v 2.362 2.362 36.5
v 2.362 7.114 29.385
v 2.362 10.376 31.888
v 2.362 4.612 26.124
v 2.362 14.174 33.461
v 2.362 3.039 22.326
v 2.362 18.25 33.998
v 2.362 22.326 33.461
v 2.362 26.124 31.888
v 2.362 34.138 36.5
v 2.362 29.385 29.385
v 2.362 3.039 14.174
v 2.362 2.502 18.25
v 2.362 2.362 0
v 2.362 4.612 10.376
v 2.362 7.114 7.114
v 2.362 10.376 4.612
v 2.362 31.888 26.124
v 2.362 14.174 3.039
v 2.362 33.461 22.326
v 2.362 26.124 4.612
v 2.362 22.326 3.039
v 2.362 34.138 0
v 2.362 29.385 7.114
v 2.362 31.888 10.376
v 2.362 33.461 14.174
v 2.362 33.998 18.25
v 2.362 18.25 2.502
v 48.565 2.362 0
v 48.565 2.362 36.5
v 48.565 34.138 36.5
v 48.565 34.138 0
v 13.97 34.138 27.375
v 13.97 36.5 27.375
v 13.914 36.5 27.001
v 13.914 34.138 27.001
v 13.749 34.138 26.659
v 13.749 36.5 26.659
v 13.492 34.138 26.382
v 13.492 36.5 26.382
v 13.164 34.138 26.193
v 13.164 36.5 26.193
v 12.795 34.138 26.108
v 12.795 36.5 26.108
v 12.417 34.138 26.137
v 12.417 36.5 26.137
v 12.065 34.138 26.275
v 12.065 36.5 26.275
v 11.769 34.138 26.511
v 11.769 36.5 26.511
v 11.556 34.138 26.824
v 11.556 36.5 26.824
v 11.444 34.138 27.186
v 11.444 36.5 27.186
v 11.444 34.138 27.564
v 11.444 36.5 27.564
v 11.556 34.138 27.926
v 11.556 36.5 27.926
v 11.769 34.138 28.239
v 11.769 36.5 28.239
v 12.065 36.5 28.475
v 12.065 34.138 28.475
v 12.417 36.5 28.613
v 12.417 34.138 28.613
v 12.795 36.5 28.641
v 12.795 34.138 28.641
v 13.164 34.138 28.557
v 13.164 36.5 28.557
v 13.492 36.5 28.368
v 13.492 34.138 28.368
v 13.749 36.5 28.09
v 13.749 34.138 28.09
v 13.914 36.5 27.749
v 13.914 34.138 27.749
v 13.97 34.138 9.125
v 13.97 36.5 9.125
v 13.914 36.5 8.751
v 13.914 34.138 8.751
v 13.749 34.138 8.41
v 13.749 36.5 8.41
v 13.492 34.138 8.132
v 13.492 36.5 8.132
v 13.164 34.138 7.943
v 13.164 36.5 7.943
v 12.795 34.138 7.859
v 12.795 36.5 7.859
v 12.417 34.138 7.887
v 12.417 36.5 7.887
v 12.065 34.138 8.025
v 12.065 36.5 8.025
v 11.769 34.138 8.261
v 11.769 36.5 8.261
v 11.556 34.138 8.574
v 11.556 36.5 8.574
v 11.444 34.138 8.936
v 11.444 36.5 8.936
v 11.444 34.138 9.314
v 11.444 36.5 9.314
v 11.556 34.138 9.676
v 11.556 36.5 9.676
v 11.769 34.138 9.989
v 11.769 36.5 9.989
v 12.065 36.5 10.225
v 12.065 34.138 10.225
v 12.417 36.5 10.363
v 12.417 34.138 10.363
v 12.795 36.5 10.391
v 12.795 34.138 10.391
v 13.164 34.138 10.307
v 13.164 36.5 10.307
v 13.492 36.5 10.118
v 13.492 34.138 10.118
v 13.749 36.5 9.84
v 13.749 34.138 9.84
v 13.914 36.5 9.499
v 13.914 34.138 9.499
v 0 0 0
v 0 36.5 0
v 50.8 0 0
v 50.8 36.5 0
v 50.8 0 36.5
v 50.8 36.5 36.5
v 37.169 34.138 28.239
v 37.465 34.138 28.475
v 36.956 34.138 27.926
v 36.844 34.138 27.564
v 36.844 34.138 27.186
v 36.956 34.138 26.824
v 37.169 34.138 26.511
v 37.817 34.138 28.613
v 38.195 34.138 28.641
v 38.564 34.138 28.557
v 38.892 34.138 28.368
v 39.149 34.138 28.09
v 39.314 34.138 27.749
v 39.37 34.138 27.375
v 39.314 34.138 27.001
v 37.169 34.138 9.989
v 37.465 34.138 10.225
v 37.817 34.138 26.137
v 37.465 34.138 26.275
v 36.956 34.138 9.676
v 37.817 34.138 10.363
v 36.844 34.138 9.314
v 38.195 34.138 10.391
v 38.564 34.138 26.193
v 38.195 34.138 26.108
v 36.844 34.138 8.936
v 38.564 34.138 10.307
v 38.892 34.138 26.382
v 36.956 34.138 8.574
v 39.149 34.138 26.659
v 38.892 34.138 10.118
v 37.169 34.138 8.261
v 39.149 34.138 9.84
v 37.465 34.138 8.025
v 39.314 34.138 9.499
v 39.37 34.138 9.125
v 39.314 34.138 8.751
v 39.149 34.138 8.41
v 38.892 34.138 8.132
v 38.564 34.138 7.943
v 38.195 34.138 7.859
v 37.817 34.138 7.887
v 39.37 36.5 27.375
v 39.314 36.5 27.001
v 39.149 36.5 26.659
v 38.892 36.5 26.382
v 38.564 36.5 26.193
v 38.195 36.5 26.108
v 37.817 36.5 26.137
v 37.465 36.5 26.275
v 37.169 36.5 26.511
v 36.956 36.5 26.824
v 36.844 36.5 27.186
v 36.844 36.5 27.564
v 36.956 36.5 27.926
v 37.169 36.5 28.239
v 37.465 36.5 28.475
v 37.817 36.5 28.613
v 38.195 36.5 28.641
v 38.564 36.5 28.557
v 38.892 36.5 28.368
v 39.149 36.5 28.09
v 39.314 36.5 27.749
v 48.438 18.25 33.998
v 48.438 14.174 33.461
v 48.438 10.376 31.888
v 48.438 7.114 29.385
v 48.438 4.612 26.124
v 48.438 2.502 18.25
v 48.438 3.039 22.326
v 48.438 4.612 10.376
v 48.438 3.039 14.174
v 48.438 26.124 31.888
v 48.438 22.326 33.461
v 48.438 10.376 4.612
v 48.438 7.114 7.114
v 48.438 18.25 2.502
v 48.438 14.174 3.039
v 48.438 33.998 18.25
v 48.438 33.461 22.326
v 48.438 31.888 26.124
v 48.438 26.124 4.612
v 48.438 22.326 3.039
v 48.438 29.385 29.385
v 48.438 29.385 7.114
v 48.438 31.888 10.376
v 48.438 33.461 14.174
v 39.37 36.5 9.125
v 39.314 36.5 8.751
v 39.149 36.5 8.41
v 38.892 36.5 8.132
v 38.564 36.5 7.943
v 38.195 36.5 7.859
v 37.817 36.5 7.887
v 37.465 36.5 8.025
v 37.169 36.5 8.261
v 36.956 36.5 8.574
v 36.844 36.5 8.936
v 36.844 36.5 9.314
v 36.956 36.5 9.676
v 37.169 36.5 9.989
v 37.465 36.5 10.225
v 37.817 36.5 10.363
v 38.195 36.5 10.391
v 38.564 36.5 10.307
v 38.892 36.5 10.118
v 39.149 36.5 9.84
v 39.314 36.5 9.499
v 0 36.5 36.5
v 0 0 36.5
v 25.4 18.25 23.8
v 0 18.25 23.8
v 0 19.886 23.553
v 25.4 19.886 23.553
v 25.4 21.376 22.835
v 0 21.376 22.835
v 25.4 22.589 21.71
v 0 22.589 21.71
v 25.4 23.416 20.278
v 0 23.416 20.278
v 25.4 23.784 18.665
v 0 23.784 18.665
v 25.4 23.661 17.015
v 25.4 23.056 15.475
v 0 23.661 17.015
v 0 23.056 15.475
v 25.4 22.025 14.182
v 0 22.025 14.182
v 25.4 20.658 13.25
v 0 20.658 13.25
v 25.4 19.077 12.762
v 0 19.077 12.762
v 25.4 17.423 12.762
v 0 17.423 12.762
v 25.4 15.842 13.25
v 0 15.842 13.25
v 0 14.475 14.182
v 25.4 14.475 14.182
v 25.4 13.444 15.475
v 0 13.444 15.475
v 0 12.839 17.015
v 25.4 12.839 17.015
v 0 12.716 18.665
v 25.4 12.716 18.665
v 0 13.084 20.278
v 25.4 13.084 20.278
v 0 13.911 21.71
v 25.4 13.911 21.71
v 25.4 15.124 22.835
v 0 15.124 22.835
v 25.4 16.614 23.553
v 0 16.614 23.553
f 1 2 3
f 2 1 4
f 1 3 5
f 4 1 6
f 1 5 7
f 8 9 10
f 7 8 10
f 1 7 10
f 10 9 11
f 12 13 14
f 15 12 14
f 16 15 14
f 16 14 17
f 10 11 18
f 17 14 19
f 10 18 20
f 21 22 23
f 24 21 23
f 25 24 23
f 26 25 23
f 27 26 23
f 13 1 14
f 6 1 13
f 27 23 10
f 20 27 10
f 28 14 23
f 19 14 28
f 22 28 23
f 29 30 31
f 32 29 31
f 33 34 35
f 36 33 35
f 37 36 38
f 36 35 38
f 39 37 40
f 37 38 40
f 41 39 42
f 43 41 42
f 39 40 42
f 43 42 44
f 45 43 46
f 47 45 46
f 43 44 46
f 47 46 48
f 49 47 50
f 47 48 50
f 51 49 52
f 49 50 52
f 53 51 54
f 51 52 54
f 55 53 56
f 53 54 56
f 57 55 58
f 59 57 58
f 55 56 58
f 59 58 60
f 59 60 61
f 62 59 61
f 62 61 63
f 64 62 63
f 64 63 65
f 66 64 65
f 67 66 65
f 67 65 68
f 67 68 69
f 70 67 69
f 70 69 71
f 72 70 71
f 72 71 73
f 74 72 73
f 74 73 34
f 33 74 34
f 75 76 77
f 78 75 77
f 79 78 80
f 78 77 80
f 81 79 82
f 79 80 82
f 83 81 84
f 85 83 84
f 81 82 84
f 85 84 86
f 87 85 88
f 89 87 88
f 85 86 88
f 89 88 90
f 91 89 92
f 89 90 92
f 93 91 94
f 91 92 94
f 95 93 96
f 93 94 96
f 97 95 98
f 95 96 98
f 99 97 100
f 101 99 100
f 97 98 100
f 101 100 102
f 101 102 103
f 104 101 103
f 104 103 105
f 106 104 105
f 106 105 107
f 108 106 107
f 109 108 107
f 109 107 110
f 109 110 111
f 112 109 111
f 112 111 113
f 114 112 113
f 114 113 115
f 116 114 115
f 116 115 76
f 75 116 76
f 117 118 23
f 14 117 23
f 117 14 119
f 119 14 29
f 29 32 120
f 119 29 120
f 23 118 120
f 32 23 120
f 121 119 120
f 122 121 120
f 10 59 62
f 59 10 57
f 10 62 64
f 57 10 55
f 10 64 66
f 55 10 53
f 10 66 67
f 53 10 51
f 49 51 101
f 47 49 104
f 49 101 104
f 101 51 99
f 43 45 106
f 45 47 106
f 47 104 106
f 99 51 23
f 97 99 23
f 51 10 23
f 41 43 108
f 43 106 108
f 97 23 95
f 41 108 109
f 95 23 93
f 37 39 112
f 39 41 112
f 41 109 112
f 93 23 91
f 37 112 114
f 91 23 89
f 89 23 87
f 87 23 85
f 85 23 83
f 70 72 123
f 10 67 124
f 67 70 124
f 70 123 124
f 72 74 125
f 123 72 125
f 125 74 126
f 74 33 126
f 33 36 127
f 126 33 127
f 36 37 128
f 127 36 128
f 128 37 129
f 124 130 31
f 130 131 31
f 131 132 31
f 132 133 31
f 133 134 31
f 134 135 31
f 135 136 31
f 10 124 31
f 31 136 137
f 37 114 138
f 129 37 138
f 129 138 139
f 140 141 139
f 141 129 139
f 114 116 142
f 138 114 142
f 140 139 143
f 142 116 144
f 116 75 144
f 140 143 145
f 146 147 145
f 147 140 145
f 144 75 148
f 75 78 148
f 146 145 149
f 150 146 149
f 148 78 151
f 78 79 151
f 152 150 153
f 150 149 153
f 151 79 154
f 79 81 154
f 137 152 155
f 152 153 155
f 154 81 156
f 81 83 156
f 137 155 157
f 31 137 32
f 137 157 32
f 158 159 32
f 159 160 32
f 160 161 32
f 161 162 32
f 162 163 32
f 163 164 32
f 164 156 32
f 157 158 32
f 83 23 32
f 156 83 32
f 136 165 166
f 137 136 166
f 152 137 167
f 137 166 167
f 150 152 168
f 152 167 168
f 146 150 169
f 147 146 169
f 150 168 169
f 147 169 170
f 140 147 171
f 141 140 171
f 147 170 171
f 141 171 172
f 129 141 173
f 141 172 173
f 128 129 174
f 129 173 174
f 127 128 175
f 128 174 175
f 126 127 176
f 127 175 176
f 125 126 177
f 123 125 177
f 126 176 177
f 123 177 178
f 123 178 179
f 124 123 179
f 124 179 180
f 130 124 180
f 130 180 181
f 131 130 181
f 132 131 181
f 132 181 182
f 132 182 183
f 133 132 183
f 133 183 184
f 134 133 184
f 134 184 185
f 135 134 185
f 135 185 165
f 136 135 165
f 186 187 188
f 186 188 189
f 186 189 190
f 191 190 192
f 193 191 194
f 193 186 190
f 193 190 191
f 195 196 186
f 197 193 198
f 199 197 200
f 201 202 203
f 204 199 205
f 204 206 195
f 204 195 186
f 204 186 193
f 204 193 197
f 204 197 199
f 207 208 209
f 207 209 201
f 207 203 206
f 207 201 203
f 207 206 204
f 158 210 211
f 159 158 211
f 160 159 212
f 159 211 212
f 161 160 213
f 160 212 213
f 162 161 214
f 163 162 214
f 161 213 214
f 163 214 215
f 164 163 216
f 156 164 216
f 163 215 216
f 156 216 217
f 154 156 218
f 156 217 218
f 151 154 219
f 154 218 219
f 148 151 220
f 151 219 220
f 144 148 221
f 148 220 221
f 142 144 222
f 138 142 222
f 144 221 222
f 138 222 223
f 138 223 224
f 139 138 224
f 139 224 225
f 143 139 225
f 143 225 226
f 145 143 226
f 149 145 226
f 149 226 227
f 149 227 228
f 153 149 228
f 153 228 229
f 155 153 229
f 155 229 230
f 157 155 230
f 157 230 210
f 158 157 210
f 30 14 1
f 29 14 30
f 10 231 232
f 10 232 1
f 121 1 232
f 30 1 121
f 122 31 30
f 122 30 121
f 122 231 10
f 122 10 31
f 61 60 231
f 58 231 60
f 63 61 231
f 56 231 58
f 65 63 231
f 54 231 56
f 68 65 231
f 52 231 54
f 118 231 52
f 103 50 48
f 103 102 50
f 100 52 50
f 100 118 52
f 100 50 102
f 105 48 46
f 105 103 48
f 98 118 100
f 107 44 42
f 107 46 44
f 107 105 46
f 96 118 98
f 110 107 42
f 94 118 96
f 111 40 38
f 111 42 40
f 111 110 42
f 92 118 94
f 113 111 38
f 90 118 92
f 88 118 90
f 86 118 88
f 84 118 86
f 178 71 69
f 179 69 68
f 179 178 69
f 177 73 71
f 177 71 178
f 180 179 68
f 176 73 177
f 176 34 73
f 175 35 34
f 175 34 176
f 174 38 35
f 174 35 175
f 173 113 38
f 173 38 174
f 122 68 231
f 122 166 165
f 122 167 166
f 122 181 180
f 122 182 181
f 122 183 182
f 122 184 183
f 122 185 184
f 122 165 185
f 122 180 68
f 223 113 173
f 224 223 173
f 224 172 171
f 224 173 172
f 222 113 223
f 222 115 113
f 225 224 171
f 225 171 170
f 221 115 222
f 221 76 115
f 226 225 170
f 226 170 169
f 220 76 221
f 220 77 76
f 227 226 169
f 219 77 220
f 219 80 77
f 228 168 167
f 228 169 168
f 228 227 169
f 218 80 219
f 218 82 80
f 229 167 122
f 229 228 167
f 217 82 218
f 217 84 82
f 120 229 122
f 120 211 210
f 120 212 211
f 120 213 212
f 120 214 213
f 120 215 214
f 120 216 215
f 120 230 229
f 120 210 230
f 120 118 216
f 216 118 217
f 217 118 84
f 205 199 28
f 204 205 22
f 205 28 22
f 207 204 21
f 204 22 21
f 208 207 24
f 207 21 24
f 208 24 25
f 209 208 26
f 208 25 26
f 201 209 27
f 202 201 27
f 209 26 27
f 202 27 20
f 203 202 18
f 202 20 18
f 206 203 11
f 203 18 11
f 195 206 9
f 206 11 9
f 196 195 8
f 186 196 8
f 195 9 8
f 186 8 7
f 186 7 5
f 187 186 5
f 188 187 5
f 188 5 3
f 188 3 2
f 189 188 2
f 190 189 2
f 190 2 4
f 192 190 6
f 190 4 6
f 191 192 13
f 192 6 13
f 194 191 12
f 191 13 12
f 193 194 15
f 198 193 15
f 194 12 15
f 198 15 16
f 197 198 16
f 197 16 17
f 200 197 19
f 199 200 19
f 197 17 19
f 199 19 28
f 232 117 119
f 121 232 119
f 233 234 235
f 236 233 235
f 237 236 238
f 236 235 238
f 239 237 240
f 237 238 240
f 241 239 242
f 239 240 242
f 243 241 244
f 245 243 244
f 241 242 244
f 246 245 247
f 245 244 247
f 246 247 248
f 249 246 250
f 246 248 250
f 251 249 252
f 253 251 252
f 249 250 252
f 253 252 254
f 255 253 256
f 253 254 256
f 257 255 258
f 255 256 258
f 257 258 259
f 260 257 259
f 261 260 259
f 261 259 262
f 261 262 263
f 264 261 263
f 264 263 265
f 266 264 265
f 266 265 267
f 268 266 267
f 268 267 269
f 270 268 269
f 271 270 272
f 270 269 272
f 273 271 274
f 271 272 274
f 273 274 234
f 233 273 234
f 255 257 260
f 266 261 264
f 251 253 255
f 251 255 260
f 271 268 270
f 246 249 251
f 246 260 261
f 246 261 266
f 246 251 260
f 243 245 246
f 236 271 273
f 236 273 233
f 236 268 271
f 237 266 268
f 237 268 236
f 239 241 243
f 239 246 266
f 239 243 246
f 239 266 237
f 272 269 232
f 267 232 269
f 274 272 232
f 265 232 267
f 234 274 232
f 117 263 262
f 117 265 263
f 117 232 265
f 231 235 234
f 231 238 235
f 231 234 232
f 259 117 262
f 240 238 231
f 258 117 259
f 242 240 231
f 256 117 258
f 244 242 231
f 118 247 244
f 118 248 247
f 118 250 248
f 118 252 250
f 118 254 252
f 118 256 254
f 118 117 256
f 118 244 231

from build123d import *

# Parameters (mm, degrees)
SKETCH1_W           = 50.8
SKETCH1_H           = 36.4998
SKETCH1_W_2         = 46.203262774
SKETCH1_H_2         = 31.7754
BOSS_EXTRUDE1_DEPTH = 36.4998
SKETCH8_R           = 15.748
BOSS_EXTRUDE3_DEPTH = 46.0756
SKETCH9_R           = 5.5499
CUT_EXTRUDE1_DEPTH  = 25.4
CUT_EXTRUDE2_REACH  = 38.5
SKETCH10_R          = 1.27


with BuildPart() as part:
    # Sketch1 → Boss-Extrude1 (new body)
    with BuildSketch(Plane.XY):
        with Locations((25.4, 18.2499)):
            Rectangle(SKETCH1_W, SKETCH1_H)
        with Locations((25.463831387, 18.2499)):
            Rectangle(SKETCH1_W_2, SKETCH1_H_2, mode=Mode.SUBTRACT)
    extrude(amount=BOSS_EXTRUDE1_DEPTH)

    # Sketch8 → Boss-Extrude3 (add)
    with BuildSketch(Plane(origin=(2.3622, 0, 0), x_dir=(0, 0, -1), z_dir=(1, 0, 0))):
        with Locations((-18.2499, 18.2499)):
            Circle(SKETCH8_R)
    extrude(amount=BOSS_EXTRUDE3_DEPTH)

    # Sketch9 → Cut-Extrude1 (cut)
    with BuildSketch(Plane.ZY):
        with Locations((18.2499, 18.2499)):
            Circle(SKETCH9_R)
    extrude(amount=-CUT_EXTRUDE1_DEPTH, mode=Mode.SUBTRACT)

    # Sketch10 → Cut-Extrude2 (cut, up to next)
    with BuildSketch(Plane(origin=(0, 36.4998, 0), x_dir=(1, 0, 0), z_dir=(0, 1, 0)), mode=Mode.PRIVATE) as cut_extrude2_sk1:
        with Locations((38.1, -9.12495)):
            Circle(SKETCH10_R)
    cut_extrude2_tool1 = extrude(cut_extrude2_sk1.sketch, amount=-CUT_EXTRUDE2_REACH, mode=Mode.PRIVATE) & part.part
    add(cut_extrude2_tool1.solids().sort_by_distance((38.1, 36.4998, 9.12495))[0], mode=Mode.SUBTRACT)
    # Sketch10 → Cut-Extrude2 (cut, up to next)
    with BuildSketch(Plane(origin=(0, 36.4998, 0), x_dir=(1, 0, 0), z_dir=(0, 1, 0)), mode=Mode.PRIVATE) as cut_extrude2_sk2:
        with Locations((12.7, -9.12495)):
            Circle(SKETCH10_R)
    cut_extrude2_tool2 = extrude(cut_extrude2_sk2.sketch, amount=-CUT_EXTRUDE2_REACH, mode=Mode.PRIVATE) & part.part
    add(cut_extrude2_tool2.solids().sort_by_distance((12.7, 36.4998, 9.12495))[0], mode=Mode.SUBTRACT)
    # Sketch10 → Cut-Extrude2 (cut, up to next)
    with BuildSketch(Plane(origin=(0, 36.4998, 0), x_dir=(1, 0, 0), z_dir=(0, 1, 0)), mode=Mode.PRIVATE) as cut_extrude2_sk3:
        with Locations((38.1, -27.37485)):
            Circle(SKETCH10_R)
    cut_extrude2_tool3 = extrude(cut_extrude2_sk3.sketch, amount=-CUT_EXTRUDE2_REACH, mode=Mode.PRIVATE) & part.part
    add(cut_extrude2_tool3.solids().sort_by_distance((38.1, 36.4998, 27.37485))[0], mode=Mode.SUBTRACT)
    # Sketch10 → Cut-Extrude2 (cut, up to next)
    with BuildSketch(Plane(origin=(0, 36.4998, 0), x_dir=(1, 0, 0), z_dir=(0, 1, 0)), mode=Mode.PRIVATE) as cut_extrude2_sk4:
        with Locations((12.7, -27.37485)):
            Circle(SKETCH10_R)
    cut_extrude2_tool4 = extrude(cut_extrude2_sk4.sketch, amount=-CUT_EXTRUDE2_REACH, mode=Mode.PRIVATE) & part.part
    add(cut_extrude2_tool4.solids().sort_by_distance((12.7, 36.4998, 27.37485))[0], mode=Mode.SUBTRACT)


solid = part.part
